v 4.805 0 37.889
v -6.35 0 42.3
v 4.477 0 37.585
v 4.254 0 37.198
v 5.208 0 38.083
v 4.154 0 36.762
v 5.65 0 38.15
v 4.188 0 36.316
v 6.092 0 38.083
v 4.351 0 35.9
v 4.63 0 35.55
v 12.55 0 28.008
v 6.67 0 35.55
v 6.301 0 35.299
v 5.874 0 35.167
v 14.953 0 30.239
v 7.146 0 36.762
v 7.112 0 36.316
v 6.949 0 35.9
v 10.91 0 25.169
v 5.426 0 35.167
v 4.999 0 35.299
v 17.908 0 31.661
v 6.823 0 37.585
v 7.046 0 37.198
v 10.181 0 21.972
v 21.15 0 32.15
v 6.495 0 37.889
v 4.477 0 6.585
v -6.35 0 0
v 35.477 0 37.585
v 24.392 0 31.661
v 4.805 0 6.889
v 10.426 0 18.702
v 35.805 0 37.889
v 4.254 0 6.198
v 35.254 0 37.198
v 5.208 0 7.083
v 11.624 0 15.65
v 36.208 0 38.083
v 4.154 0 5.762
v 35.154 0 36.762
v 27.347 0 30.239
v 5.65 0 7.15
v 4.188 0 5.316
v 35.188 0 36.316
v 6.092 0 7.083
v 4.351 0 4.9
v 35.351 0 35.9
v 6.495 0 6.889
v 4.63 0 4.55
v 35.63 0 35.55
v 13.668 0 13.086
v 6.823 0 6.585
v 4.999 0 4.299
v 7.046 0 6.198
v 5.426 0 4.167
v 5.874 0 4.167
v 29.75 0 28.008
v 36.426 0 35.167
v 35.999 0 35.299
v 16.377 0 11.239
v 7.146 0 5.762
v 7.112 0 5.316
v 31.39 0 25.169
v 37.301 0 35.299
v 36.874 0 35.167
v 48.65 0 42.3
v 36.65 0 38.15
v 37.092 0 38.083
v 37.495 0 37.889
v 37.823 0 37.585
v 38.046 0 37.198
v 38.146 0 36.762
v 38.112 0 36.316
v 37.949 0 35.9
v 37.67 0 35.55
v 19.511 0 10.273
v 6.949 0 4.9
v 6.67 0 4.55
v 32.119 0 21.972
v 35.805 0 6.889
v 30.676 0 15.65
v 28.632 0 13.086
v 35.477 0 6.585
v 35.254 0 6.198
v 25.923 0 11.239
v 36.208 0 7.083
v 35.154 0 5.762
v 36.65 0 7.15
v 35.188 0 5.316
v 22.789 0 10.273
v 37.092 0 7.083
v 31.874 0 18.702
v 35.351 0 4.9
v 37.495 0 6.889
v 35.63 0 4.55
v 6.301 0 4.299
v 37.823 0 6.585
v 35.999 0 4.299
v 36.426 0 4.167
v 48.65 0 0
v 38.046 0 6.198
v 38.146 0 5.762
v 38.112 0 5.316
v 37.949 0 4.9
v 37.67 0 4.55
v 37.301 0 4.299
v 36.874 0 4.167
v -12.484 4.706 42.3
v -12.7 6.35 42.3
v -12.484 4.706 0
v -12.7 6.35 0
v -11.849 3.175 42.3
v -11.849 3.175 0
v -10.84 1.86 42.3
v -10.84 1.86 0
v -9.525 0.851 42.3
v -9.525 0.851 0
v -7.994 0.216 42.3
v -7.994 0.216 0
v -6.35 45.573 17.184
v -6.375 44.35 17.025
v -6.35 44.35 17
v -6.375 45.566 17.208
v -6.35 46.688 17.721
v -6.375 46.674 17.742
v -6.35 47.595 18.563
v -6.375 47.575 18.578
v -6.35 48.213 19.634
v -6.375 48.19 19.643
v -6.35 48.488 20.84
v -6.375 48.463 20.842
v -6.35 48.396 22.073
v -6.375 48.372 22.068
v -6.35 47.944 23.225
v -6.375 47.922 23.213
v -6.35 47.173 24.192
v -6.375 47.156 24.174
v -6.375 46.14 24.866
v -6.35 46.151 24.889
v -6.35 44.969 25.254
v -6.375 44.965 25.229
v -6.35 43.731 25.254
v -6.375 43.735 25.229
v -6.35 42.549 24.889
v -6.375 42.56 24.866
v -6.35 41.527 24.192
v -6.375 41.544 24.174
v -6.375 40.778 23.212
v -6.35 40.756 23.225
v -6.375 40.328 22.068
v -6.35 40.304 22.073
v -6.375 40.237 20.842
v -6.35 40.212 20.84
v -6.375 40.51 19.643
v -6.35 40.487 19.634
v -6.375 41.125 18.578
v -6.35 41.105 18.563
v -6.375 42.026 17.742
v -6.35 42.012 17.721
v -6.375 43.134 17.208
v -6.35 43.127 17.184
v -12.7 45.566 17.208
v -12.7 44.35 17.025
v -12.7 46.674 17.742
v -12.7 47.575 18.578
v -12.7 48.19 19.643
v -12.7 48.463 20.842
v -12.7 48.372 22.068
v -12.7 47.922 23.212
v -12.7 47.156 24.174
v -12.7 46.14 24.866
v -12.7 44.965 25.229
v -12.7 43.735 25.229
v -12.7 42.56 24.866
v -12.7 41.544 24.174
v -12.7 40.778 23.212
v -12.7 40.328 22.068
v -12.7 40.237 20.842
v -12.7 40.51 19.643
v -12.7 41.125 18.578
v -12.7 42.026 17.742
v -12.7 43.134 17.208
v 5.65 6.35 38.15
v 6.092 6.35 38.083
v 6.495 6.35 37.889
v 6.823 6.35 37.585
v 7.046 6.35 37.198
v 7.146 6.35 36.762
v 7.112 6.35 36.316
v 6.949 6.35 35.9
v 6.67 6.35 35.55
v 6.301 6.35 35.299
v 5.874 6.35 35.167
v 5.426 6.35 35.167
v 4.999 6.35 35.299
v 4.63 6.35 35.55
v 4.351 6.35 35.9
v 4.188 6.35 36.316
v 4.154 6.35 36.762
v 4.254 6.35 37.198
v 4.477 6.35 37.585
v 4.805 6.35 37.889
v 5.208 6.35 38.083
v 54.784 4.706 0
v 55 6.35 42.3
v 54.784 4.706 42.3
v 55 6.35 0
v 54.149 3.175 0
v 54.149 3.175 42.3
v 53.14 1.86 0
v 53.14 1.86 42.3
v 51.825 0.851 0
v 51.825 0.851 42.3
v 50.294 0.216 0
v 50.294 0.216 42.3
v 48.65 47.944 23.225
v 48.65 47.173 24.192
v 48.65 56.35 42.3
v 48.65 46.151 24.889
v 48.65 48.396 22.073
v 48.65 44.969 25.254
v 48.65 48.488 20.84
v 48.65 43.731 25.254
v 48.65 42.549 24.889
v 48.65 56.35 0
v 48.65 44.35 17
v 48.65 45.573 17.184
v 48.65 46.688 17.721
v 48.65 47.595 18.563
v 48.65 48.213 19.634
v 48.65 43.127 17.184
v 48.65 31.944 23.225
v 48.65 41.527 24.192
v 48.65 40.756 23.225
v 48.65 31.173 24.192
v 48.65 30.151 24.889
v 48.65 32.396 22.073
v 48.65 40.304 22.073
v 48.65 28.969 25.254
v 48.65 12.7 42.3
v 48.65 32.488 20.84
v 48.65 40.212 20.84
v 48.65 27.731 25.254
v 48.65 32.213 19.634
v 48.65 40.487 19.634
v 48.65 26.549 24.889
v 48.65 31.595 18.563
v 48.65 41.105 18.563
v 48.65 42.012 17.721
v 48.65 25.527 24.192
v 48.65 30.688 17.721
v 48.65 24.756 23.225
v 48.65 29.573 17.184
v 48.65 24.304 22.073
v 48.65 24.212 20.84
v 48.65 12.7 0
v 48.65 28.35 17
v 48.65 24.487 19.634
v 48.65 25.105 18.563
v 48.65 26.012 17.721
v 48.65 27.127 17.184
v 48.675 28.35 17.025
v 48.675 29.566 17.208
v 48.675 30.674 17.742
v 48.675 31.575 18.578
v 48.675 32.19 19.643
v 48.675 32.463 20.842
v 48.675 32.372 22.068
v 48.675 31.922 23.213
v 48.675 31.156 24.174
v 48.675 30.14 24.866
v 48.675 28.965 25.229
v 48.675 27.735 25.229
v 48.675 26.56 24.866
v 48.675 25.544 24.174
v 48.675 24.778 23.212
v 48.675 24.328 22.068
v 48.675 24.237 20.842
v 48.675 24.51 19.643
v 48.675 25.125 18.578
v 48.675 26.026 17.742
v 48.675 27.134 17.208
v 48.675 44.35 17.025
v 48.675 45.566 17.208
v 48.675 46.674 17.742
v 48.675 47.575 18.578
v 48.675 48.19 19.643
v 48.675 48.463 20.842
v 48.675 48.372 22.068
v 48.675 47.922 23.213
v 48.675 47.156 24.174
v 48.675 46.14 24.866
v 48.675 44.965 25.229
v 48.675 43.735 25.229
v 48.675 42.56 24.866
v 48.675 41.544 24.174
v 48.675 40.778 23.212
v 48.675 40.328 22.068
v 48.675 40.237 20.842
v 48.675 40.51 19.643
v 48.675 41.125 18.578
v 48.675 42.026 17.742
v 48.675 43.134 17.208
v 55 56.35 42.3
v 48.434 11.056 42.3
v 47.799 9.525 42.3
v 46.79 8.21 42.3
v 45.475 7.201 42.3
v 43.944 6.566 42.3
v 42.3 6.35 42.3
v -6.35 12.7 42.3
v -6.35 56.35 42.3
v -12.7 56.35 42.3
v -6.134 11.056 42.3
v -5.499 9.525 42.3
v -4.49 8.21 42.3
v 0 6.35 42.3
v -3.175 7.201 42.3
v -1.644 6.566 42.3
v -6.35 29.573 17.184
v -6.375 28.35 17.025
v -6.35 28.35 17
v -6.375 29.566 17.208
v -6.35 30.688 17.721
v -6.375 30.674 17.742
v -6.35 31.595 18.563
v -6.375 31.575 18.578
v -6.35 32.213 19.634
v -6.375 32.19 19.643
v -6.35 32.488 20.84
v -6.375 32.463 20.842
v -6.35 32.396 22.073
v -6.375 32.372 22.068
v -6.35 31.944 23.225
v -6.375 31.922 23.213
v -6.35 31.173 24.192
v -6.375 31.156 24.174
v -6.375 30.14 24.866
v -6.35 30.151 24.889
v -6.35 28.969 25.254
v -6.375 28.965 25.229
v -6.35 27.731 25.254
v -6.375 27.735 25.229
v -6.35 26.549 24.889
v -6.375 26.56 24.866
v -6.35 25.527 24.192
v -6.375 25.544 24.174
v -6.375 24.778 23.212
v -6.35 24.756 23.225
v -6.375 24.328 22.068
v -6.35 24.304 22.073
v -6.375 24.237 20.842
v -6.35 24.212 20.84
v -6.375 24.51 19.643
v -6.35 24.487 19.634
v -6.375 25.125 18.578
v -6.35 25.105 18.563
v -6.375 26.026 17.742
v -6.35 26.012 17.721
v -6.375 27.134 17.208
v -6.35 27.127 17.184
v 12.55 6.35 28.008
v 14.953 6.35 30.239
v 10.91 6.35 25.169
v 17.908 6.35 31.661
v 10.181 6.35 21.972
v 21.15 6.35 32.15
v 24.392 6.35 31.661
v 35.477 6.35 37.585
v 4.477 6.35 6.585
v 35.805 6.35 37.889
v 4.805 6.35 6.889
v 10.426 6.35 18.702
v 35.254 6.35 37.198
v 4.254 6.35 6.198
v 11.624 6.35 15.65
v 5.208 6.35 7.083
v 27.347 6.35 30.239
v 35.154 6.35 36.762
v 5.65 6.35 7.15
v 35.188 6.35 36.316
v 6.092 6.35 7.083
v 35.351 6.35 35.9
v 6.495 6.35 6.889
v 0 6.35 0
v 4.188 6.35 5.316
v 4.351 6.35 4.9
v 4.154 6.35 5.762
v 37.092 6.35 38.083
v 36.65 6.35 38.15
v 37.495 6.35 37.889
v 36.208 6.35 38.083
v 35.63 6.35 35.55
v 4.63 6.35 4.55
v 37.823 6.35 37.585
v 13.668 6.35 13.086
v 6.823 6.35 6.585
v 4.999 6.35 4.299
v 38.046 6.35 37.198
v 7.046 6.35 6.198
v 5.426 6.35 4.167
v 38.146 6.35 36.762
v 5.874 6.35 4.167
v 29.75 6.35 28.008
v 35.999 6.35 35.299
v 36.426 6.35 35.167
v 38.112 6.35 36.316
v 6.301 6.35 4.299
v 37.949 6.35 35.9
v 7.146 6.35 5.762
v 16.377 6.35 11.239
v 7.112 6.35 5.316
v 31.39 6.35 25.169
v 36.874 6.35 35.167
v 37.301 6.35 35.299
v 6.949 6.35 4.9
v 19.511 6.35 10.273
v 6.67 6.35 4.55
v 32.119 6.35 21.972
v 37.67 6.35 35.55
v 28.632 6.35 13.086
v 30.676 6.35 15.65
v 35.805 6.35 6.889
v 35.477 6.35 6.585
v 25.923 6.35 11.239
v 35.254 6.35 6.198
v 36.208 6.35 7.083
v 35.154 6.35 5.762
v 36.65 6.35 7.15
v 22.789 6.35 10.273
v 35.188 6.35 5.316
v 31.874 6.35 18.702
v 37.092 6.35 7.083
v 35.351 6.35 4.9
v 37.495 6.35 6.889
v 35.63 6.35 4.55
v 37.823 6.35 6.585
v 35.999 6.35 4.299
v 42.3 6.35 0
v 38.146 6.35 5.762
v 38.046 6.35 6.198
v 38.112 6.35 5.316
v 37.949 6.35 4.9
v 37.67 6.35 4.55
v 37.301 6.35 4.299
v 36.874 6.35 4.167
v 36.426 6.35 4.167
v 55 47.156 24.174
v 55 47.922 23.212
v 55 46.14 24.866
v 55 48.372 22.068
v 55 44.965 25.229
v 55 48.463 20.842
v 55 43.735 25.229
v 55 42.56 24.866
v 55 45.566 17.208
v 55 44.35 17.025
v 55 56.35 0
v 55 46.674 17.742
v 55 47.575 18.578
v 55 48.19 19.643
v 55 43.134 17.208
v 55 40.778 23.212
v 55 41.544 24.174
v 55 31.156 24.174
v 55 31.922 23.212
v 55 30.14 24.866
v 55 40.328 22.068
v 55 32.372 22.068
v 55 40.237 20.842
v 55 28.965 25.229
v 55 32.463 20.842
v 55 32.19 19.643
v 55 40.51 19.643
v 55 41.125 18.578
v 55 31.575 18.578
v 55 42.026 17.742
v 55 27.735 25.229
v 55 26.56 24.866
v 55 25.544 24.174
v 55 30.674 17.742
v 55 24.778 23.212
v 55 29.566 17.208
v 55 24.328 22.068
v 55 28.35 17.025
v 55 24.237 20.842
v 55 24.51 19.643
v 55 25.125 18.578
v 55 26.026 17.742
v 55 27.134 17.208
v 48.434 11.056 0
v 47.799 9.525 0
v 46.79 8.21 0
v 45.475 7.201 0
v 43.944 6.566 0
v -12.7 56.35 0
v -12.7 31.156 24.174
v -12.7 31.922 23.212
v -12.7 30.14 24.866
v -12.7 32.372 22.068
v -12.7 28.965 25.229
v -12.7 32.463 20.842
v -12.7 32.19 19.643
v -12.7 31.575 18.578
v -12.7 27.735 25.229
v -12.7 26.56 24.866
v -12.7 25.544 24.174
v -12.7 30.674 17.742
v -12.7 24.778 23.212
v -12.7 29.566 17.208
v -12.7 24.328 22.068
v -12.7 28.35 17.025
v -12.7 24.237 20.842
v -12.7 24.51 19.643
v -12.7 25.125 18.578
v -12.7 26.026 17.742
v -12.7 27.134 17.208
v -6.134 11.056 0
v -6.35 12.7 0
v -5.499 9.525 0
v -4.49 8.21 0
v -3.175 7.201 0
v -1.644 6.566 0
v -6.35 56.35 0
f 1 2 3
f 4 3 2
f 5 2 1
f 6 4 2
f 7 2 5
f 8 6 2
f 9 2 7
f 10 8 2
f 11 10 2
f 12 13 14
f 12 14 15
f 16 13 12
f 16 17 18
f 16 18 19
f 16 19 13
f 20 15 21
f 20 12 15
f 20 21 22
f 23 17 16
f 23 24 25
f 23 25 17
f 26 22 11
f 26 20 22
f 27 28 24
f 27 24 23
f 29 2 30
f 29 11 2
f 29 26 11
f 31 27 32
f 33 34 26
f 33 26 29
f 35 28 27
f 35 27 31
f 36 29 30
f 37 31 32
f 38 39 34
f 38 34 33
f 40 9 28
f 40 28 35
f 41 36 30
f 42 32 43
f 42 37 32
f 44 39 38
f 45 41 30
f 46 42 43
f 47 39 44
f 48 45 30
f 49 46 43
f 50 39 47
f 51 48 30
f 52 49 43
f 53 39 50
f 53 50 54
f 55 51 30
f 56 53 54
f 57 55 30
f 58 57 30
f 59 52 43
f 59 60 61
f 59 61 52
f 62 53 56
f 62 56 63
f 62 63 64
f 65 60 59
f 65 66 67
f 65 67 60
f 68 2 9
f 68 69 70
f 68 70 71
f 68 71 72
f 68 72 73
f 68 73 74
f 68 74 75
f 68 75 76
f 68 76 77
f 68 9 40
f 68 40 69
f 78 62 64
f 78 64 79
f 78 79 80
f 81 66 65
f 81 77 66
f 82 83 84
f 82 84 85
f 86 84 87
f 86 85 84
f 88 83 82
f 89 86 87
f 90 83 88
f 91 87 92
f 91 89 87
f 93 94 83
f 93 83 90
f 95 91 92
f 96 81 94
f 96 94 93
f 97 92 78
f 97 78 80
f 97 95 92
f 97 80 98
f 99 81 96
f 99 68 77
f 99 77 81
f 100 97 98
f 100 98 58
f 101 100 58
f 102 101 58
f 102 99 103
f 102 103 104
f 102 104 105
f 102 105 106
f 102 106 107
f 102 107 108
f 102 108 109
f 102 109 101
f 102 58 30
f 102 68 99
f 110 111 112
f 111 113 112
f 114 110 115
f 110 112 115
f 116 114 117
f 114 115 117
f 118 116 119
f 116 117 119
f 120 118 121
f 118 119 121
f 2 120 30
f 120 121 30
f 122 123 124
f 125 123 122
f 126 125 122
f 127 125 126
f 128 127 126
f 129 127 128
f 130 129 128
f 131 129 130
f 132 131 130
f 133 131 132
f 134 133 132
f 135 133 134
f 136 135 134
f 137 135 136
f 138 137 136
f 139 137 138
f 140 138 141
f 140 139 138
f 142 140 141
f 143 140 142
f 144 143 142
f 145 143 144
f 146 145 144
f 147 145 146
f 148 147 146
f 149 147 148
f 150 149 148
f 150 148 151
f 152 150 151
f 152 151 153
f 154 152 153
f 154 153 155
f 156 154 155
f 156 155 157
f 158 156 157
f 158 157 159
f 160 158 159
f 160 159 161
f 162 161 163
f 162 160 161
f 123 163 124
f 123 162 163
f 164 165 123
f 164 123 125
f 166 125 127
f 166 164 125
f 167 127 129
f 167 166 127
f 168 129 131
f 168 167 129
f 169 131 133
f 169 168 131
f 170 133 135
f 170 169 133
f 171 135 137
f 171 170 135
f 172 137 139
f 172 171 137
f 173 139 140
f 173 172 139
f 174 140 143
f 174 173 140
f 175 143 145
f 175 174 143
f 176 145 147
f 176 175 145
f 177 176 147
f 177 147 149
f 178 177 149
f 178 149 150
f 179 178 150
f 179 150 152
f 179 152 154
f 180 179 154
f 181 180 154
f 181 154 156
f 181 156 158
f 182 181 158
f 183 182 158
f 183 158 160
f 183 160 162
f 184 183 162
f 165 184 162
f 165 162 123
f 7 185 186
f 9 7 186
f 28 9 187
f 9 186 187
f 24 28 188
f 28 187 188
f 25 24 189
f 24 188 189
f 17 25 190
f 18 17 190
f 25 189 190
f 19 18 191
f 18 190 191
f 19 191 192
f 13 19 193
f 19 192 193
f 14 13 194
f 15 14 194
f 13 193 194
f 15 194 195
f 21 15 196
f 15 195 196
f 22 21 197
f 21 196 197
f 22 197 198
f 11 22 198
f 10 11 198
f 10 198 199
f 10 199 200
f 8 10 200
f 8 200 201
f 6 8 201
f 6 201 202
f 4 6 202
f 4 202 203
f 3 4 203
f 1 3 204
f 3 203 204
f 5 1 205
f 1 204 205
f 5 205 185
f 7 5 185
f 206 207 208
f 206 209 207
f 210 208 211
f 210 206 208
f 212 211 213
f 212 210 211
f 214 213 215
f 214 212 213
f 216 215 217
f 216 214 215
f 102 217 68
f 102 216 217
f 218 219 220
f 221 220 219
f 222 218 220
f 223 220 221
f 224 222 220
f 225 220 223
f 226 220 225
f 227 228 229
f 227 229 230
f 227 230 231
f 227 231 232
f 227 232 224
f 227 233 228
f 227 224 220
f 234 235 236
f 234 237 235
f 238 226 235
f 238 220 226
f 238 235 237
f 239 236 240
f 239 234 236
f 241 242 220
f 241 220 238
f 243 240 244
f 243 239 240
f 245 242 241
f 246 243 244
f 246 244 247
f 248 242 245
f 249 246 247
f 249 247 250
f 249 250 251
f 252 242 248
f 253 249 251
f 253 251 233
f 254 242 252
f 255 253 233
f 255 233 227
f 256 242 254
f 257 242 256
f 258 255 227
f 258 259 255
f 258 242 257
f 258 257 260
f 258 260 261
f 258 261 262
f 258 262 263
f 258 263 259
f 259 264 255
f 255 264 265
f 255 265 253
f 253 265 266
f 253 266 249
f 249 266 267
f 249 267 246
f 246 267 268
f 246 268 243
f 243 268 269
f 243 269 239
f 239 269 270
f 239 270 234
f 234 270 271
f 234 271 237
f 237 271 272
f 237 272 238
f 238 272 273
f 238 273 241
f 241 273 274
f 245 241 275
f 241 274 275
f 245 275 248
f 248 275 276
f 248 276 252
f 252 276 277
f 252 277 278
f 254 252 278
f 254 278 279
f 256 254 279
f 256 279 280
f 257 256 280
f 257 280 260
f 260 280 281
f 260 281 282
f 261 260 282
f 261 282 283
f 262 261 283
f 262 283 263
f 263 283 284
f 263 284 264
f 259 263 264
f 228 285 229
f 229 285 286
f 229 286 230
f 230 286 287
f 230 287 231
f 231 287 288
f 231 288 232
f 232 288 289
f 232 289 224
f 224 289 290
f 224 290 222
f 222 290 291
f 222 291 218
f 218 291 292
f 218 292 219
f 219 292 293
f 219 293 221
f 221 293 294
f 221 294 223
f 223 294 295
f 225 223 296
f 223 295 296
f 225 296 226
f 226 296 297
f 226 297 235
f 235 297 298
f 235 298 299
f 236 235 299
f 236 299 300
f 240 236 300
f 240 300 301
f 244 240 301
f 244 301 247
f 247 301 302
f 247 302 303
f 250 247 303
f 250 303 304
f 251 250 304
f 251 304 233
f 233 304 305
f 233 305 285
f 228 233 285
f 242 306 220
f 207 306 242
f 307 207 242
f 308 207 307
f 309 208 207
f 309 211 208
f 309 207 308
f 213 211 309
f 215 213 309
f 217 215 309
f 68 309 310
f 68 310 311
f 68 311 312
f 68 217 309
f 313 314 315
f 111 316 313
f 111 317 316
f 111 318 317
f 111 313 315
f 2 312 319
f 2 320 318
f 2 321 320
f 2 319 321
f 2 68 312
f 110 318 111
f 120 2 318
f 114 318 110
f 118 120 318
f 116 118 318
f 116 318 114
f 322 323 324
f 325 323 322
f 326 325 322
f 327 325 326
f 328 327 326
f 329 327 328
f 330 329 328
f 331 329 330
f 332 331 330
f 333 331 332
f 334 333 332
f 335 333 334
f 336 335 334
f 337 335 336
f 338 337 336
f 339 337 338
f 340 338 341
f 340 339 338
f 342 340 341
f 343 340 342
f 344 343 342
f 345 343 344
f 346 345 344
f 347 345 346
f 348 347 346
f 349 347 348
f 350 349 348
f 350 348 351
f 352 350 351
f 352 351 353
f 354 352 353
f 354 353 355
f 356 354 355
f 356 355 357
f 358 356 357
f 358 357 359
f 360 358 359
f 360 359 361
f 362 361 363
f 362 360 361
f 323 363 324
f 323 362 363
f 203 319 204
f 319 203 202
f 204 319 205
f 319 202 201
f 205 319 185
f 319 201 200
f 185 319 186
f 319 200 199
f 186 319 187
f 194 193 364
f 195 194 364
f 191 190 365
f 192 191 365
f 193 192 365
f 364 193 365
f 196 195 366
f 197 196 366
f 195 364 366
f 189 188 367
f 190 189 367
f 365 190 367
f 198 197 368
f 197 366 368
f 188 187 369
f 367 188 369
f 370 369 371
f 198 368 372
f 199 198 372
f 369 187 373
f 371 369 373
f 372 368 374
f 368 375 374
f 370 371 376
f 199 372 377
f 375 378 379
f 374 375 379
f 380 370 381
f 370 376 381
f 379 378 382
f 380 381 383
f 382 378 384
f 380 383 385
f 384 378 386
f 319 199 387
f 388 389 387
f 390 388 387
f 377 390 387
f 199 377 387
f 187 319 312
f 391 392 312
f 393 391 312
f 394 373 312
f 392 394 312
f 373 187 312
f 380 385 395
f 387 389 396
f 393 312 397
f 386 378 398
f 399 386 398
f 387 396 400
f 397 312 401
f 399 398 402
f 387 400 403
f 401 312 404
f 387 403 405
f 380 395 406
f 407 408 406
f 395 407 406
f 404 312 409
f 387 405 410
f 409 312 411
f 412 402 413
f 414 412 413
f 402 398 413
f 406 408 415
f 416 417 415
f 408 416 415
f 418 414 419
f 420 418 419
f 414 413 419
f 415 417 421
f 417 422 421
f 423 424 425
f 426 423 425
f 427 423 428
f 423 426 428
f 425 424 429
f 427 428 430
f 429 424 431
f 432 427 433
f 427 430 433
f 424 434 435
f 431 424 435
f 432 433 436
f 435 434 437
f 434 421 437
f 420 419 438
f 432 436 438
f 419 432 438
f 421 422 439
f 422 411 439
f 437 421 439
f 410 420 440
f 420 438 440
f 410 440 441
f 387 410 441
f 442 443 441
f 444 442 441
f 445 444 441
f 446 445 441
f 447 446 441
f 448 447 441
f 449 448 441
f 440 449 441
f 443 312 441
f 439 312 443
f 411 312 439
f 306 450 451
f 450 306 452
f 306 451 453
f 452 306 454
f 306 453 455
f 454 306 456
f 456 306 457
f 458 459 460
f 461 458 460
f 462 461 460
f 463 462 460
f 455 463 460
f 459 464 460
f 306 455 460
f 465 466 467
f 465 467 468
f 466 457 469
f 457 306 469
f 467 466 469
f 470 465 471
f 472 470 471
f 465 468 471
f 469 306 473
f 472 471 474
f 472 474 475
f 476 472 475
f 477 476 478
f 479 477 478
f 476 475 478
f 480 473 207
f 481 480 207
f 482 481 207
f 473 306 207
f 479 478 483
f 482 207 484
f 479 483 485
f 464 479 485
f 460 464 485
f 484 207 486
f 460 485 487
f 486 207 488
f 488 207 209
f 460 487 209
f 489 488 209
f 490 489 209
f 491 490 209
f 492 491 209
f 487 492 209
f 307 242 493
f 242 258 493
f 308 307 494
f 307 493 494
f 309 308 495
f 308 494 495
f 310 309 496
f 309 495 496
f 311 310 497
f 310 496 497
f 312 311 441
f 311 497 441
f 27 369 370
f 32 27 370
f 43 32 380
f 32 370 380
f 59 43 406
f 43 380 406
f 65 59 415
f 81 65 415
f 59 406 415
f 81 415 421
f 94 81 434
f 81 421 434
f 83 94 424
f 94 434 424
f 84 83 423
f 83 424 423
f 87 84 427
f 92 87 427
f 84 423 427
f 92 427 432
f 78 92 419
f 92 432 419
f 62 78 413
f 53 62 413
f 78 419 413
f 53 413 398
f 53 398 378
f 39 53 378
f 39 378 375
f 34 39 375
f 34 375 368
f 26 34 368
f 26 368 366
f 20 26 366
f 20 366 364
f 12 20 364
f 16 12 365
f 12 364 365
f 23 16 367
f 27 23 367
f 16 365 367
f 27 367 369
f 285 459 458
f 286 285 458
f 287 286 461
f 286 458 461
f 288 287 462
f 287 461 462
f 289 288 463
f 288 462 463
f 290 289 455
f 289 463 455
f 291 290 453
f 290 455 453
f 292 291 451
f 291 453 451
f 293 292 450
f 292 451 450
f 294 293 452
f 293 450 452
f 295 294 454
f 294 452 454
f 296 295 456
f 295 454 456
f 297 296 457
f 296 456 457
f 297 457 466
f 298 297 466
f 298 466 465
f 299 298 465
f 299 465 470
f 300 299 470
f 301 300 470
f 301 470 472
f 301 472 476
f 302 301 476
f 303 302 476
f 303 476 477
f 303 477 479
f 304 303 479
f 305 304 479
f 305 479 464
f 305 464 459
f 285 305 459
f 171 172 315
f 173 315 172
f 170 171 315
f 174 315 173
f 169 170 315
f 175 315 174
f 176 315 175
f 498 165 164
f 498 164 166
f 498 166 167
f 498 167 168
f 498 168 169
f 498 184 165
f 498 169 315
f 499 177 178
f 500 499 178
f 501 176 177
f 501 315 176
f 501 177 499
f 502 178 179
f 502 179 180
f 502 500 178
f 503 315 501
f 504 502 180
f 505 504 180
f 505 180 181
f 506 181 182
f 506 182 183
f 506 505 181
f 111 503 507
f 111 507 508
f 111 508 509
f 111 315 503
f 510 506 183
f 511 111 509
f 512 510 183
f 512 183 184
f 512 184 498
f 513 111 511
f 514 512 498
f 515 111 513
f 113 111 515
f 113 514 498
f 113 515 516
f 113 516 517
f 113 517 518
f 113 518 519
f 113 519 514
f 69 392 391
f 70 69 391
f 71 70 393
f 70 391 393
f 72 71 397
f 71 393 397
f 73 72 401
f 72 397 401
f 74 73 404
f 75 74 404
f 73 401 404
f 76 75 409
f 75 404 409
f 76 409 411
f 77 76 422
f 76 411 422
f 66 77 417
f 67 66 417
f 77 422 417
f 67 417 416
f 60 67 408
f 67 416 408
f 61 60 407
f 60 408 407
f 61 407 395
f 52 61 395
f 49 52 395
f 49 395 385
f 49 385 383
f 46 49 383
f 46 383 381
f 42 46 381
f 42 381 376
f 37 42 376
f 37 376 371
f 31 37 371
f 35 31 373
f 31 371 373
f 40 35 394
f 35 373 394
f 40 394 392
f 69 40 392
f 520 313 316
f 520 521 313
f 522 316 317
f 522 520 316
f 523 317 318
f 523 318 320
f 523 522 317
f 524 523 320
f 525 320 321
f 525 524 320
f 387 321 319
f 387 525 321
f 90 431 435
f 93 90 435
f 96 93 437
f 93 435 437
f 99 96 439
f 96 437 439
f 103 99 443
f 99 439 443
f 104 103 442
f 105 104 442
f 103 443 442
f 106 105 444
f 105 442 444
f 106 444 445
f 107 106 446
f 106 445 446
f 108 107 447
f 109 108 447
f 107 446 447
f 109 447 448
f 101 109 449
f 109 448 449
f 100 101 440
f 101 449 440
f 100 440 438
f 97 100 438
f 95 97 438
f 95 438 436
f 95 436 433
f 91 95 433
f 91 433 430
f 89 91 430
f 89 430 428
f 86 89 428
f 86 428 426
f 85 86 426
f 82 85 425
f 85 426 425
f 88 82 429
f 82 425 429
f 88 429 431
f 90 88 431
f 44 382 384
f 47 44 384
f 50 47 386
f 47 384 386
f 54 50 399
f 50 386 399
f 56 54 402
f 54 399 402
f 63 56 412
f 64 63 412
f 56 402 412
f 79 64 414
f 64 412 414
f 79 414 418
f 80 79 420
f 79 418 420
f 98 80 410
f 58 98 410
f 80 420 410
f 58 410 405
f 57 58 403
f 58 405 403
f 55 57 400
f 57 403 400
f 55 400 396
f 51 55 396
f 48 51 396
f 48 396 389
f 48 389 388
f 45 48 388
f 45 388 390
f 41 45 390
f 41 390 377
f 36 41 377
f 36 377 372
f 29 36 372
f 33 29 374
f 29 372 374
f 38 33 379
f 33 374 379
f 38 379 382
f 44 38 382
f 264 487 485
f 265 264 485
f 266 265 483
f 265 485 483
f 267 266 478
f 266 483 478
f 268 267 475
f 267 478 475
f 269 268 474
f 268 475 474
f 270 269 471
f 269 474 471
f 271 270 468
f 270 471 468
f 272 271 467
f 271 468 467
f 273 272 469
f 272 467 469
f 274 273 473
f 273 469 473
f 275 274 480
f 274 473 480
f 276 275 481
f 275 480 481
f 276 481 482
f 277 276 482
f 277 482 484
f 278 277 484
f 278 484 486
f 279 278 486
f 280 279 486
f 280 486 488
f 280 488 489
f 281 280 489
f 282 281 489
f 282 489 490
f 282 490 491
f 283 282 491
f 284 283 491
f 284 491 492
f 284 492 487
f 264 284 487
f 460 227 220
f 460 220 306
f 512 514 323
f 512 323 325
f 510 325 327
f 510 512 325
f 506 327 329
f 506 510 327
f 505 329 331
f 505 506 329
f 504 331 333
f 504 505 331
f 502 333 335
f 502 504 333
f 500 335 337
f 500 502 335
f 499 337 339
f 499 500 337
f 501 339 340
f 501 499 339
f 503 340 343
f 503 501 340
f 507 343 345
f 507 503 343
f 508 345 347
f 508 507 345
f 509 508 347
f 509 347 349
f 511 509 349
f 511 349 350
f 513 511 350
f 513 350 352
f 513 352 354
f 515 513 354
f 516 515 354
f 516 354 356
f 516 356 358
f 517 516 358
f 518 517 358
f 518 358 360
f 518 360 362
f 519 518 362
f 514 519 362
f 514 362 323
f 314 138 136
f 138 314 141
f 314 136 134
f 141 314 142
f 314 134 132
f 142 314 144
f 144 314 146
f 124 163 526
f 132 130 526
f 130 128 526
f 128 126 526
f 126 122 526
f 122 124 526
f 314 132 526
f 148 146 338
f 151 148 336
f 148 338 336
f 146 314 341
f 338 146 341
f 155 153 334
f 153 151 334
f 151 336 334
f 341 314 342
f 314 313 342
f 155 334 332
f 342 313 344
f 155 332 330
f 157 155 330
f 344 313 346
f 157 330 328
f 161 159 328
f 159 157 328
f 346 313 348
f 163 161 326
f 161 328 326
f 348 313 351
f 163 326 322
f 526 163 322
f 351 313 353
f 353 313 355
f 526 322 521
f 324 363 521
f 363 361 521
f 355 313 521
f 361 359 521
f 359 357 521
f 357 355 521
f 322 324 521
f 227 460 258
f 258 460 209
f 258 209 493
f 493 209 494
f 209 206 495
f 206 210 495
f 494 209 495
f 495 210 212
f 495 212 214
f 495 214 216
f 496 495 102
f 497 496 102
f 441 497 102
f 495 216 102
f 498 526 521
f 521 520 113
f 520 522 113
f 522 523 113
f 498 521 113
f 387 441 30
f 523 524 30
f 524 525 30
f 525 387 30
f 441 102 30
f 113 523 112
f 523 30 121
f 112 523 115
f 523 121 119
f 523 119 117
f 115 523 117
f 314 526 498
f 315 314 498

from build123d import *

# Parameters (mm, degrees)
SKETCH1_W                              = 42.3
SKETCH1_H                              = 42.3
BOSS_EXTRUDE1_DEPTH                    = 6.35
SKETCH2_R                              = 11
SKETCH2_R_2                            = 1.5
CUT_EXTRUDE1_DEPTH                     = 6.35
SKETCH3_W                              = 42.3
SKETCH3_H                              = 6.35
BOSS_EXTRUDE2_DEPTH                    = 12.7
SKETCH4_W                              = 6.35
SKETCH4_H                              = 42.3
BOSS_EXTRUDE3_DEPTH                    = 50
FILLET1_R                              = 6.35
FILLET2_R                              = 6.35
TAP_DRILL_FOR_M8_HELICOIL1_D           = 8.25
TAP_DRILL_FOR_M8_HELICOIL1_DEPTH       = 6.35
TAP_DRILL_FOR_M8_HELICOIL1_CSINK_D     = 8.3
TAP_DRILL_FOR_M8_HELICOIL1_CSINK_ANGLE = 90
FILLET1_OF_MIRROR4_R                   = 6.35
FILLET2_OF_MIRROR4_R                   = 6.35


with BuildPart() as part:
    # Sketch1 → Boss-Extrude1 (new body)
    with BuildSketch(Plane(origin=(0, 0, 0), x_dir=(1, 0, 0), z_dir=(0, 1, 0))):
        with Locations((21.15, -21.15)):
            Rectangle(SKETCH1_W, SKETCH1_H)
    extrude(amount=BOSS_EXTRUDE1_DEPTH)

    # Sketch2 → Cut-Extrude1 (cut)
    with BuildSketch(Plane(origin=(0, 6.35, 0), x_dir=(1, 0, 0), z_dir=(0, 1, 0))):
        with Locations(Location((21.15, -21.15, 0), (0, 0, 270))):
            Circle(SKETCH2_R)
        with Locations(Location((5.65, -5.65, 0), (0, 0, 270))):
            Circle(SKETCH2_R_2)
        with Locations(Location((5.65, -36.65, 0), (0, 0, 270))):
            Circle(SKETCH2_R_2)
        with Locations(Location((36.65, -5.65, 0), (0, 0, 270))):
            Circle(SKETCH2_R_2)
        with Locations(Location((36.65, -36.65, 0), (0, 0, 270))):
            Circle(SKETCH2_R_2)
    extrude(amount=-CUT_EXTRUDE1_DEPTH, mode=Mode.SUBTRACT)

    # Sketch3 → Boss-Extrude2 (add)
    with BuildSketch(Plane(origin=(42.3, 0, 0), x_dir=(0, 0, -1), z_dir=(1, 0, 0))):
        with Locations((-21.15, 3.175)):
            Rectangle(SKETCH3_W, SKETCH3_H)
    boss_extrude2 = extrude(amount=BOSS_EXTRUDE2_DEPTH)

    # Sketch4 → Boss-Extrude3 (add)
    with BuildSketch(Plane(origin=(0, 6.35, 0), x_dir=(1, 0, 0), z_dir=(0, 1, 0))):
        with Locations((51.825, -21.15)):
            Rectangle(SKETCH4_W, SKETCH4_H)
    boss_extrude3 = extrude(amount=BOSS_EXTRUDE3_DEPTH)

    # Fillet1
    fillet1_edges = [part.edges().sort_by_distance(p)[0] for p in [
        (48.65, 6.35, 21.15),
    ]]
    fillet(fillet1_edges, radius=FILLET1_R)

    # Fillet2
    fillet2_edges = [part.edges().sort_by_distance(p)[0] for p in [
        (55, 0, 21.15),
    ]]
    fillet(fillet2_edges, radius=FILLET2_R)

    # Tap Drill for M8 Helicoil1
    with Locations(Plane.ZY.offset(-48.65)):
        with Locations((21.15, 44.35), (21.15, 28.35)):
            tap_drill_for_m8_helicoil1 = CounterSinkHole(TAP_DRILL_FOR_M8_HELICOIL1_D / 2, TAP_DRILL_FOR_M8_HELICOIL1_CSINK_D / 2, depth=TAP_DRILL_FOR_M8_HELICOIL1_DEPTH, counter_sink_angle=TAP_DRILL_FOR_M8_HELICOIL1_CSINK_ANGLE)

    # Mirror4: Boss-Extrude2, Boss-Extrude3, Tap Drill for M8 Helicoil1 across plane
    add(boss_extrude2.mirror(Plane.ZY.offset(-21.15)))
    add(boss_extrude3.mirror(Plane.ZY.offset(-21.15)))
    add(tap_drill_for_m8_helicoil1.mirror(Plane.ZY.offset(-21.15)), mode=Mode.SUBTRACT)

    # Fillet1 of Mirror4
    fillet1_of_mirror4_edges = [part.edges().sort_by_distance(p)[0] for p in [
        (-6.35, 6.35, 21.15),
    ]]
    fillet(fillet1_of_mirror4_edges, radius=FILLET1_OF_MIRROR4_R)

    # Fillet2 of Mirror4
    fillet2_of_mirror4_edges = [part.edges().sort_by_distance(p)[0] for p in [
        (-12.7, 0, 21.15),
    ]]
    fillet(fillet2_of_mirror4_edges, radius=FILLET2_OF_MIRROR4_R)


solid = part.part
